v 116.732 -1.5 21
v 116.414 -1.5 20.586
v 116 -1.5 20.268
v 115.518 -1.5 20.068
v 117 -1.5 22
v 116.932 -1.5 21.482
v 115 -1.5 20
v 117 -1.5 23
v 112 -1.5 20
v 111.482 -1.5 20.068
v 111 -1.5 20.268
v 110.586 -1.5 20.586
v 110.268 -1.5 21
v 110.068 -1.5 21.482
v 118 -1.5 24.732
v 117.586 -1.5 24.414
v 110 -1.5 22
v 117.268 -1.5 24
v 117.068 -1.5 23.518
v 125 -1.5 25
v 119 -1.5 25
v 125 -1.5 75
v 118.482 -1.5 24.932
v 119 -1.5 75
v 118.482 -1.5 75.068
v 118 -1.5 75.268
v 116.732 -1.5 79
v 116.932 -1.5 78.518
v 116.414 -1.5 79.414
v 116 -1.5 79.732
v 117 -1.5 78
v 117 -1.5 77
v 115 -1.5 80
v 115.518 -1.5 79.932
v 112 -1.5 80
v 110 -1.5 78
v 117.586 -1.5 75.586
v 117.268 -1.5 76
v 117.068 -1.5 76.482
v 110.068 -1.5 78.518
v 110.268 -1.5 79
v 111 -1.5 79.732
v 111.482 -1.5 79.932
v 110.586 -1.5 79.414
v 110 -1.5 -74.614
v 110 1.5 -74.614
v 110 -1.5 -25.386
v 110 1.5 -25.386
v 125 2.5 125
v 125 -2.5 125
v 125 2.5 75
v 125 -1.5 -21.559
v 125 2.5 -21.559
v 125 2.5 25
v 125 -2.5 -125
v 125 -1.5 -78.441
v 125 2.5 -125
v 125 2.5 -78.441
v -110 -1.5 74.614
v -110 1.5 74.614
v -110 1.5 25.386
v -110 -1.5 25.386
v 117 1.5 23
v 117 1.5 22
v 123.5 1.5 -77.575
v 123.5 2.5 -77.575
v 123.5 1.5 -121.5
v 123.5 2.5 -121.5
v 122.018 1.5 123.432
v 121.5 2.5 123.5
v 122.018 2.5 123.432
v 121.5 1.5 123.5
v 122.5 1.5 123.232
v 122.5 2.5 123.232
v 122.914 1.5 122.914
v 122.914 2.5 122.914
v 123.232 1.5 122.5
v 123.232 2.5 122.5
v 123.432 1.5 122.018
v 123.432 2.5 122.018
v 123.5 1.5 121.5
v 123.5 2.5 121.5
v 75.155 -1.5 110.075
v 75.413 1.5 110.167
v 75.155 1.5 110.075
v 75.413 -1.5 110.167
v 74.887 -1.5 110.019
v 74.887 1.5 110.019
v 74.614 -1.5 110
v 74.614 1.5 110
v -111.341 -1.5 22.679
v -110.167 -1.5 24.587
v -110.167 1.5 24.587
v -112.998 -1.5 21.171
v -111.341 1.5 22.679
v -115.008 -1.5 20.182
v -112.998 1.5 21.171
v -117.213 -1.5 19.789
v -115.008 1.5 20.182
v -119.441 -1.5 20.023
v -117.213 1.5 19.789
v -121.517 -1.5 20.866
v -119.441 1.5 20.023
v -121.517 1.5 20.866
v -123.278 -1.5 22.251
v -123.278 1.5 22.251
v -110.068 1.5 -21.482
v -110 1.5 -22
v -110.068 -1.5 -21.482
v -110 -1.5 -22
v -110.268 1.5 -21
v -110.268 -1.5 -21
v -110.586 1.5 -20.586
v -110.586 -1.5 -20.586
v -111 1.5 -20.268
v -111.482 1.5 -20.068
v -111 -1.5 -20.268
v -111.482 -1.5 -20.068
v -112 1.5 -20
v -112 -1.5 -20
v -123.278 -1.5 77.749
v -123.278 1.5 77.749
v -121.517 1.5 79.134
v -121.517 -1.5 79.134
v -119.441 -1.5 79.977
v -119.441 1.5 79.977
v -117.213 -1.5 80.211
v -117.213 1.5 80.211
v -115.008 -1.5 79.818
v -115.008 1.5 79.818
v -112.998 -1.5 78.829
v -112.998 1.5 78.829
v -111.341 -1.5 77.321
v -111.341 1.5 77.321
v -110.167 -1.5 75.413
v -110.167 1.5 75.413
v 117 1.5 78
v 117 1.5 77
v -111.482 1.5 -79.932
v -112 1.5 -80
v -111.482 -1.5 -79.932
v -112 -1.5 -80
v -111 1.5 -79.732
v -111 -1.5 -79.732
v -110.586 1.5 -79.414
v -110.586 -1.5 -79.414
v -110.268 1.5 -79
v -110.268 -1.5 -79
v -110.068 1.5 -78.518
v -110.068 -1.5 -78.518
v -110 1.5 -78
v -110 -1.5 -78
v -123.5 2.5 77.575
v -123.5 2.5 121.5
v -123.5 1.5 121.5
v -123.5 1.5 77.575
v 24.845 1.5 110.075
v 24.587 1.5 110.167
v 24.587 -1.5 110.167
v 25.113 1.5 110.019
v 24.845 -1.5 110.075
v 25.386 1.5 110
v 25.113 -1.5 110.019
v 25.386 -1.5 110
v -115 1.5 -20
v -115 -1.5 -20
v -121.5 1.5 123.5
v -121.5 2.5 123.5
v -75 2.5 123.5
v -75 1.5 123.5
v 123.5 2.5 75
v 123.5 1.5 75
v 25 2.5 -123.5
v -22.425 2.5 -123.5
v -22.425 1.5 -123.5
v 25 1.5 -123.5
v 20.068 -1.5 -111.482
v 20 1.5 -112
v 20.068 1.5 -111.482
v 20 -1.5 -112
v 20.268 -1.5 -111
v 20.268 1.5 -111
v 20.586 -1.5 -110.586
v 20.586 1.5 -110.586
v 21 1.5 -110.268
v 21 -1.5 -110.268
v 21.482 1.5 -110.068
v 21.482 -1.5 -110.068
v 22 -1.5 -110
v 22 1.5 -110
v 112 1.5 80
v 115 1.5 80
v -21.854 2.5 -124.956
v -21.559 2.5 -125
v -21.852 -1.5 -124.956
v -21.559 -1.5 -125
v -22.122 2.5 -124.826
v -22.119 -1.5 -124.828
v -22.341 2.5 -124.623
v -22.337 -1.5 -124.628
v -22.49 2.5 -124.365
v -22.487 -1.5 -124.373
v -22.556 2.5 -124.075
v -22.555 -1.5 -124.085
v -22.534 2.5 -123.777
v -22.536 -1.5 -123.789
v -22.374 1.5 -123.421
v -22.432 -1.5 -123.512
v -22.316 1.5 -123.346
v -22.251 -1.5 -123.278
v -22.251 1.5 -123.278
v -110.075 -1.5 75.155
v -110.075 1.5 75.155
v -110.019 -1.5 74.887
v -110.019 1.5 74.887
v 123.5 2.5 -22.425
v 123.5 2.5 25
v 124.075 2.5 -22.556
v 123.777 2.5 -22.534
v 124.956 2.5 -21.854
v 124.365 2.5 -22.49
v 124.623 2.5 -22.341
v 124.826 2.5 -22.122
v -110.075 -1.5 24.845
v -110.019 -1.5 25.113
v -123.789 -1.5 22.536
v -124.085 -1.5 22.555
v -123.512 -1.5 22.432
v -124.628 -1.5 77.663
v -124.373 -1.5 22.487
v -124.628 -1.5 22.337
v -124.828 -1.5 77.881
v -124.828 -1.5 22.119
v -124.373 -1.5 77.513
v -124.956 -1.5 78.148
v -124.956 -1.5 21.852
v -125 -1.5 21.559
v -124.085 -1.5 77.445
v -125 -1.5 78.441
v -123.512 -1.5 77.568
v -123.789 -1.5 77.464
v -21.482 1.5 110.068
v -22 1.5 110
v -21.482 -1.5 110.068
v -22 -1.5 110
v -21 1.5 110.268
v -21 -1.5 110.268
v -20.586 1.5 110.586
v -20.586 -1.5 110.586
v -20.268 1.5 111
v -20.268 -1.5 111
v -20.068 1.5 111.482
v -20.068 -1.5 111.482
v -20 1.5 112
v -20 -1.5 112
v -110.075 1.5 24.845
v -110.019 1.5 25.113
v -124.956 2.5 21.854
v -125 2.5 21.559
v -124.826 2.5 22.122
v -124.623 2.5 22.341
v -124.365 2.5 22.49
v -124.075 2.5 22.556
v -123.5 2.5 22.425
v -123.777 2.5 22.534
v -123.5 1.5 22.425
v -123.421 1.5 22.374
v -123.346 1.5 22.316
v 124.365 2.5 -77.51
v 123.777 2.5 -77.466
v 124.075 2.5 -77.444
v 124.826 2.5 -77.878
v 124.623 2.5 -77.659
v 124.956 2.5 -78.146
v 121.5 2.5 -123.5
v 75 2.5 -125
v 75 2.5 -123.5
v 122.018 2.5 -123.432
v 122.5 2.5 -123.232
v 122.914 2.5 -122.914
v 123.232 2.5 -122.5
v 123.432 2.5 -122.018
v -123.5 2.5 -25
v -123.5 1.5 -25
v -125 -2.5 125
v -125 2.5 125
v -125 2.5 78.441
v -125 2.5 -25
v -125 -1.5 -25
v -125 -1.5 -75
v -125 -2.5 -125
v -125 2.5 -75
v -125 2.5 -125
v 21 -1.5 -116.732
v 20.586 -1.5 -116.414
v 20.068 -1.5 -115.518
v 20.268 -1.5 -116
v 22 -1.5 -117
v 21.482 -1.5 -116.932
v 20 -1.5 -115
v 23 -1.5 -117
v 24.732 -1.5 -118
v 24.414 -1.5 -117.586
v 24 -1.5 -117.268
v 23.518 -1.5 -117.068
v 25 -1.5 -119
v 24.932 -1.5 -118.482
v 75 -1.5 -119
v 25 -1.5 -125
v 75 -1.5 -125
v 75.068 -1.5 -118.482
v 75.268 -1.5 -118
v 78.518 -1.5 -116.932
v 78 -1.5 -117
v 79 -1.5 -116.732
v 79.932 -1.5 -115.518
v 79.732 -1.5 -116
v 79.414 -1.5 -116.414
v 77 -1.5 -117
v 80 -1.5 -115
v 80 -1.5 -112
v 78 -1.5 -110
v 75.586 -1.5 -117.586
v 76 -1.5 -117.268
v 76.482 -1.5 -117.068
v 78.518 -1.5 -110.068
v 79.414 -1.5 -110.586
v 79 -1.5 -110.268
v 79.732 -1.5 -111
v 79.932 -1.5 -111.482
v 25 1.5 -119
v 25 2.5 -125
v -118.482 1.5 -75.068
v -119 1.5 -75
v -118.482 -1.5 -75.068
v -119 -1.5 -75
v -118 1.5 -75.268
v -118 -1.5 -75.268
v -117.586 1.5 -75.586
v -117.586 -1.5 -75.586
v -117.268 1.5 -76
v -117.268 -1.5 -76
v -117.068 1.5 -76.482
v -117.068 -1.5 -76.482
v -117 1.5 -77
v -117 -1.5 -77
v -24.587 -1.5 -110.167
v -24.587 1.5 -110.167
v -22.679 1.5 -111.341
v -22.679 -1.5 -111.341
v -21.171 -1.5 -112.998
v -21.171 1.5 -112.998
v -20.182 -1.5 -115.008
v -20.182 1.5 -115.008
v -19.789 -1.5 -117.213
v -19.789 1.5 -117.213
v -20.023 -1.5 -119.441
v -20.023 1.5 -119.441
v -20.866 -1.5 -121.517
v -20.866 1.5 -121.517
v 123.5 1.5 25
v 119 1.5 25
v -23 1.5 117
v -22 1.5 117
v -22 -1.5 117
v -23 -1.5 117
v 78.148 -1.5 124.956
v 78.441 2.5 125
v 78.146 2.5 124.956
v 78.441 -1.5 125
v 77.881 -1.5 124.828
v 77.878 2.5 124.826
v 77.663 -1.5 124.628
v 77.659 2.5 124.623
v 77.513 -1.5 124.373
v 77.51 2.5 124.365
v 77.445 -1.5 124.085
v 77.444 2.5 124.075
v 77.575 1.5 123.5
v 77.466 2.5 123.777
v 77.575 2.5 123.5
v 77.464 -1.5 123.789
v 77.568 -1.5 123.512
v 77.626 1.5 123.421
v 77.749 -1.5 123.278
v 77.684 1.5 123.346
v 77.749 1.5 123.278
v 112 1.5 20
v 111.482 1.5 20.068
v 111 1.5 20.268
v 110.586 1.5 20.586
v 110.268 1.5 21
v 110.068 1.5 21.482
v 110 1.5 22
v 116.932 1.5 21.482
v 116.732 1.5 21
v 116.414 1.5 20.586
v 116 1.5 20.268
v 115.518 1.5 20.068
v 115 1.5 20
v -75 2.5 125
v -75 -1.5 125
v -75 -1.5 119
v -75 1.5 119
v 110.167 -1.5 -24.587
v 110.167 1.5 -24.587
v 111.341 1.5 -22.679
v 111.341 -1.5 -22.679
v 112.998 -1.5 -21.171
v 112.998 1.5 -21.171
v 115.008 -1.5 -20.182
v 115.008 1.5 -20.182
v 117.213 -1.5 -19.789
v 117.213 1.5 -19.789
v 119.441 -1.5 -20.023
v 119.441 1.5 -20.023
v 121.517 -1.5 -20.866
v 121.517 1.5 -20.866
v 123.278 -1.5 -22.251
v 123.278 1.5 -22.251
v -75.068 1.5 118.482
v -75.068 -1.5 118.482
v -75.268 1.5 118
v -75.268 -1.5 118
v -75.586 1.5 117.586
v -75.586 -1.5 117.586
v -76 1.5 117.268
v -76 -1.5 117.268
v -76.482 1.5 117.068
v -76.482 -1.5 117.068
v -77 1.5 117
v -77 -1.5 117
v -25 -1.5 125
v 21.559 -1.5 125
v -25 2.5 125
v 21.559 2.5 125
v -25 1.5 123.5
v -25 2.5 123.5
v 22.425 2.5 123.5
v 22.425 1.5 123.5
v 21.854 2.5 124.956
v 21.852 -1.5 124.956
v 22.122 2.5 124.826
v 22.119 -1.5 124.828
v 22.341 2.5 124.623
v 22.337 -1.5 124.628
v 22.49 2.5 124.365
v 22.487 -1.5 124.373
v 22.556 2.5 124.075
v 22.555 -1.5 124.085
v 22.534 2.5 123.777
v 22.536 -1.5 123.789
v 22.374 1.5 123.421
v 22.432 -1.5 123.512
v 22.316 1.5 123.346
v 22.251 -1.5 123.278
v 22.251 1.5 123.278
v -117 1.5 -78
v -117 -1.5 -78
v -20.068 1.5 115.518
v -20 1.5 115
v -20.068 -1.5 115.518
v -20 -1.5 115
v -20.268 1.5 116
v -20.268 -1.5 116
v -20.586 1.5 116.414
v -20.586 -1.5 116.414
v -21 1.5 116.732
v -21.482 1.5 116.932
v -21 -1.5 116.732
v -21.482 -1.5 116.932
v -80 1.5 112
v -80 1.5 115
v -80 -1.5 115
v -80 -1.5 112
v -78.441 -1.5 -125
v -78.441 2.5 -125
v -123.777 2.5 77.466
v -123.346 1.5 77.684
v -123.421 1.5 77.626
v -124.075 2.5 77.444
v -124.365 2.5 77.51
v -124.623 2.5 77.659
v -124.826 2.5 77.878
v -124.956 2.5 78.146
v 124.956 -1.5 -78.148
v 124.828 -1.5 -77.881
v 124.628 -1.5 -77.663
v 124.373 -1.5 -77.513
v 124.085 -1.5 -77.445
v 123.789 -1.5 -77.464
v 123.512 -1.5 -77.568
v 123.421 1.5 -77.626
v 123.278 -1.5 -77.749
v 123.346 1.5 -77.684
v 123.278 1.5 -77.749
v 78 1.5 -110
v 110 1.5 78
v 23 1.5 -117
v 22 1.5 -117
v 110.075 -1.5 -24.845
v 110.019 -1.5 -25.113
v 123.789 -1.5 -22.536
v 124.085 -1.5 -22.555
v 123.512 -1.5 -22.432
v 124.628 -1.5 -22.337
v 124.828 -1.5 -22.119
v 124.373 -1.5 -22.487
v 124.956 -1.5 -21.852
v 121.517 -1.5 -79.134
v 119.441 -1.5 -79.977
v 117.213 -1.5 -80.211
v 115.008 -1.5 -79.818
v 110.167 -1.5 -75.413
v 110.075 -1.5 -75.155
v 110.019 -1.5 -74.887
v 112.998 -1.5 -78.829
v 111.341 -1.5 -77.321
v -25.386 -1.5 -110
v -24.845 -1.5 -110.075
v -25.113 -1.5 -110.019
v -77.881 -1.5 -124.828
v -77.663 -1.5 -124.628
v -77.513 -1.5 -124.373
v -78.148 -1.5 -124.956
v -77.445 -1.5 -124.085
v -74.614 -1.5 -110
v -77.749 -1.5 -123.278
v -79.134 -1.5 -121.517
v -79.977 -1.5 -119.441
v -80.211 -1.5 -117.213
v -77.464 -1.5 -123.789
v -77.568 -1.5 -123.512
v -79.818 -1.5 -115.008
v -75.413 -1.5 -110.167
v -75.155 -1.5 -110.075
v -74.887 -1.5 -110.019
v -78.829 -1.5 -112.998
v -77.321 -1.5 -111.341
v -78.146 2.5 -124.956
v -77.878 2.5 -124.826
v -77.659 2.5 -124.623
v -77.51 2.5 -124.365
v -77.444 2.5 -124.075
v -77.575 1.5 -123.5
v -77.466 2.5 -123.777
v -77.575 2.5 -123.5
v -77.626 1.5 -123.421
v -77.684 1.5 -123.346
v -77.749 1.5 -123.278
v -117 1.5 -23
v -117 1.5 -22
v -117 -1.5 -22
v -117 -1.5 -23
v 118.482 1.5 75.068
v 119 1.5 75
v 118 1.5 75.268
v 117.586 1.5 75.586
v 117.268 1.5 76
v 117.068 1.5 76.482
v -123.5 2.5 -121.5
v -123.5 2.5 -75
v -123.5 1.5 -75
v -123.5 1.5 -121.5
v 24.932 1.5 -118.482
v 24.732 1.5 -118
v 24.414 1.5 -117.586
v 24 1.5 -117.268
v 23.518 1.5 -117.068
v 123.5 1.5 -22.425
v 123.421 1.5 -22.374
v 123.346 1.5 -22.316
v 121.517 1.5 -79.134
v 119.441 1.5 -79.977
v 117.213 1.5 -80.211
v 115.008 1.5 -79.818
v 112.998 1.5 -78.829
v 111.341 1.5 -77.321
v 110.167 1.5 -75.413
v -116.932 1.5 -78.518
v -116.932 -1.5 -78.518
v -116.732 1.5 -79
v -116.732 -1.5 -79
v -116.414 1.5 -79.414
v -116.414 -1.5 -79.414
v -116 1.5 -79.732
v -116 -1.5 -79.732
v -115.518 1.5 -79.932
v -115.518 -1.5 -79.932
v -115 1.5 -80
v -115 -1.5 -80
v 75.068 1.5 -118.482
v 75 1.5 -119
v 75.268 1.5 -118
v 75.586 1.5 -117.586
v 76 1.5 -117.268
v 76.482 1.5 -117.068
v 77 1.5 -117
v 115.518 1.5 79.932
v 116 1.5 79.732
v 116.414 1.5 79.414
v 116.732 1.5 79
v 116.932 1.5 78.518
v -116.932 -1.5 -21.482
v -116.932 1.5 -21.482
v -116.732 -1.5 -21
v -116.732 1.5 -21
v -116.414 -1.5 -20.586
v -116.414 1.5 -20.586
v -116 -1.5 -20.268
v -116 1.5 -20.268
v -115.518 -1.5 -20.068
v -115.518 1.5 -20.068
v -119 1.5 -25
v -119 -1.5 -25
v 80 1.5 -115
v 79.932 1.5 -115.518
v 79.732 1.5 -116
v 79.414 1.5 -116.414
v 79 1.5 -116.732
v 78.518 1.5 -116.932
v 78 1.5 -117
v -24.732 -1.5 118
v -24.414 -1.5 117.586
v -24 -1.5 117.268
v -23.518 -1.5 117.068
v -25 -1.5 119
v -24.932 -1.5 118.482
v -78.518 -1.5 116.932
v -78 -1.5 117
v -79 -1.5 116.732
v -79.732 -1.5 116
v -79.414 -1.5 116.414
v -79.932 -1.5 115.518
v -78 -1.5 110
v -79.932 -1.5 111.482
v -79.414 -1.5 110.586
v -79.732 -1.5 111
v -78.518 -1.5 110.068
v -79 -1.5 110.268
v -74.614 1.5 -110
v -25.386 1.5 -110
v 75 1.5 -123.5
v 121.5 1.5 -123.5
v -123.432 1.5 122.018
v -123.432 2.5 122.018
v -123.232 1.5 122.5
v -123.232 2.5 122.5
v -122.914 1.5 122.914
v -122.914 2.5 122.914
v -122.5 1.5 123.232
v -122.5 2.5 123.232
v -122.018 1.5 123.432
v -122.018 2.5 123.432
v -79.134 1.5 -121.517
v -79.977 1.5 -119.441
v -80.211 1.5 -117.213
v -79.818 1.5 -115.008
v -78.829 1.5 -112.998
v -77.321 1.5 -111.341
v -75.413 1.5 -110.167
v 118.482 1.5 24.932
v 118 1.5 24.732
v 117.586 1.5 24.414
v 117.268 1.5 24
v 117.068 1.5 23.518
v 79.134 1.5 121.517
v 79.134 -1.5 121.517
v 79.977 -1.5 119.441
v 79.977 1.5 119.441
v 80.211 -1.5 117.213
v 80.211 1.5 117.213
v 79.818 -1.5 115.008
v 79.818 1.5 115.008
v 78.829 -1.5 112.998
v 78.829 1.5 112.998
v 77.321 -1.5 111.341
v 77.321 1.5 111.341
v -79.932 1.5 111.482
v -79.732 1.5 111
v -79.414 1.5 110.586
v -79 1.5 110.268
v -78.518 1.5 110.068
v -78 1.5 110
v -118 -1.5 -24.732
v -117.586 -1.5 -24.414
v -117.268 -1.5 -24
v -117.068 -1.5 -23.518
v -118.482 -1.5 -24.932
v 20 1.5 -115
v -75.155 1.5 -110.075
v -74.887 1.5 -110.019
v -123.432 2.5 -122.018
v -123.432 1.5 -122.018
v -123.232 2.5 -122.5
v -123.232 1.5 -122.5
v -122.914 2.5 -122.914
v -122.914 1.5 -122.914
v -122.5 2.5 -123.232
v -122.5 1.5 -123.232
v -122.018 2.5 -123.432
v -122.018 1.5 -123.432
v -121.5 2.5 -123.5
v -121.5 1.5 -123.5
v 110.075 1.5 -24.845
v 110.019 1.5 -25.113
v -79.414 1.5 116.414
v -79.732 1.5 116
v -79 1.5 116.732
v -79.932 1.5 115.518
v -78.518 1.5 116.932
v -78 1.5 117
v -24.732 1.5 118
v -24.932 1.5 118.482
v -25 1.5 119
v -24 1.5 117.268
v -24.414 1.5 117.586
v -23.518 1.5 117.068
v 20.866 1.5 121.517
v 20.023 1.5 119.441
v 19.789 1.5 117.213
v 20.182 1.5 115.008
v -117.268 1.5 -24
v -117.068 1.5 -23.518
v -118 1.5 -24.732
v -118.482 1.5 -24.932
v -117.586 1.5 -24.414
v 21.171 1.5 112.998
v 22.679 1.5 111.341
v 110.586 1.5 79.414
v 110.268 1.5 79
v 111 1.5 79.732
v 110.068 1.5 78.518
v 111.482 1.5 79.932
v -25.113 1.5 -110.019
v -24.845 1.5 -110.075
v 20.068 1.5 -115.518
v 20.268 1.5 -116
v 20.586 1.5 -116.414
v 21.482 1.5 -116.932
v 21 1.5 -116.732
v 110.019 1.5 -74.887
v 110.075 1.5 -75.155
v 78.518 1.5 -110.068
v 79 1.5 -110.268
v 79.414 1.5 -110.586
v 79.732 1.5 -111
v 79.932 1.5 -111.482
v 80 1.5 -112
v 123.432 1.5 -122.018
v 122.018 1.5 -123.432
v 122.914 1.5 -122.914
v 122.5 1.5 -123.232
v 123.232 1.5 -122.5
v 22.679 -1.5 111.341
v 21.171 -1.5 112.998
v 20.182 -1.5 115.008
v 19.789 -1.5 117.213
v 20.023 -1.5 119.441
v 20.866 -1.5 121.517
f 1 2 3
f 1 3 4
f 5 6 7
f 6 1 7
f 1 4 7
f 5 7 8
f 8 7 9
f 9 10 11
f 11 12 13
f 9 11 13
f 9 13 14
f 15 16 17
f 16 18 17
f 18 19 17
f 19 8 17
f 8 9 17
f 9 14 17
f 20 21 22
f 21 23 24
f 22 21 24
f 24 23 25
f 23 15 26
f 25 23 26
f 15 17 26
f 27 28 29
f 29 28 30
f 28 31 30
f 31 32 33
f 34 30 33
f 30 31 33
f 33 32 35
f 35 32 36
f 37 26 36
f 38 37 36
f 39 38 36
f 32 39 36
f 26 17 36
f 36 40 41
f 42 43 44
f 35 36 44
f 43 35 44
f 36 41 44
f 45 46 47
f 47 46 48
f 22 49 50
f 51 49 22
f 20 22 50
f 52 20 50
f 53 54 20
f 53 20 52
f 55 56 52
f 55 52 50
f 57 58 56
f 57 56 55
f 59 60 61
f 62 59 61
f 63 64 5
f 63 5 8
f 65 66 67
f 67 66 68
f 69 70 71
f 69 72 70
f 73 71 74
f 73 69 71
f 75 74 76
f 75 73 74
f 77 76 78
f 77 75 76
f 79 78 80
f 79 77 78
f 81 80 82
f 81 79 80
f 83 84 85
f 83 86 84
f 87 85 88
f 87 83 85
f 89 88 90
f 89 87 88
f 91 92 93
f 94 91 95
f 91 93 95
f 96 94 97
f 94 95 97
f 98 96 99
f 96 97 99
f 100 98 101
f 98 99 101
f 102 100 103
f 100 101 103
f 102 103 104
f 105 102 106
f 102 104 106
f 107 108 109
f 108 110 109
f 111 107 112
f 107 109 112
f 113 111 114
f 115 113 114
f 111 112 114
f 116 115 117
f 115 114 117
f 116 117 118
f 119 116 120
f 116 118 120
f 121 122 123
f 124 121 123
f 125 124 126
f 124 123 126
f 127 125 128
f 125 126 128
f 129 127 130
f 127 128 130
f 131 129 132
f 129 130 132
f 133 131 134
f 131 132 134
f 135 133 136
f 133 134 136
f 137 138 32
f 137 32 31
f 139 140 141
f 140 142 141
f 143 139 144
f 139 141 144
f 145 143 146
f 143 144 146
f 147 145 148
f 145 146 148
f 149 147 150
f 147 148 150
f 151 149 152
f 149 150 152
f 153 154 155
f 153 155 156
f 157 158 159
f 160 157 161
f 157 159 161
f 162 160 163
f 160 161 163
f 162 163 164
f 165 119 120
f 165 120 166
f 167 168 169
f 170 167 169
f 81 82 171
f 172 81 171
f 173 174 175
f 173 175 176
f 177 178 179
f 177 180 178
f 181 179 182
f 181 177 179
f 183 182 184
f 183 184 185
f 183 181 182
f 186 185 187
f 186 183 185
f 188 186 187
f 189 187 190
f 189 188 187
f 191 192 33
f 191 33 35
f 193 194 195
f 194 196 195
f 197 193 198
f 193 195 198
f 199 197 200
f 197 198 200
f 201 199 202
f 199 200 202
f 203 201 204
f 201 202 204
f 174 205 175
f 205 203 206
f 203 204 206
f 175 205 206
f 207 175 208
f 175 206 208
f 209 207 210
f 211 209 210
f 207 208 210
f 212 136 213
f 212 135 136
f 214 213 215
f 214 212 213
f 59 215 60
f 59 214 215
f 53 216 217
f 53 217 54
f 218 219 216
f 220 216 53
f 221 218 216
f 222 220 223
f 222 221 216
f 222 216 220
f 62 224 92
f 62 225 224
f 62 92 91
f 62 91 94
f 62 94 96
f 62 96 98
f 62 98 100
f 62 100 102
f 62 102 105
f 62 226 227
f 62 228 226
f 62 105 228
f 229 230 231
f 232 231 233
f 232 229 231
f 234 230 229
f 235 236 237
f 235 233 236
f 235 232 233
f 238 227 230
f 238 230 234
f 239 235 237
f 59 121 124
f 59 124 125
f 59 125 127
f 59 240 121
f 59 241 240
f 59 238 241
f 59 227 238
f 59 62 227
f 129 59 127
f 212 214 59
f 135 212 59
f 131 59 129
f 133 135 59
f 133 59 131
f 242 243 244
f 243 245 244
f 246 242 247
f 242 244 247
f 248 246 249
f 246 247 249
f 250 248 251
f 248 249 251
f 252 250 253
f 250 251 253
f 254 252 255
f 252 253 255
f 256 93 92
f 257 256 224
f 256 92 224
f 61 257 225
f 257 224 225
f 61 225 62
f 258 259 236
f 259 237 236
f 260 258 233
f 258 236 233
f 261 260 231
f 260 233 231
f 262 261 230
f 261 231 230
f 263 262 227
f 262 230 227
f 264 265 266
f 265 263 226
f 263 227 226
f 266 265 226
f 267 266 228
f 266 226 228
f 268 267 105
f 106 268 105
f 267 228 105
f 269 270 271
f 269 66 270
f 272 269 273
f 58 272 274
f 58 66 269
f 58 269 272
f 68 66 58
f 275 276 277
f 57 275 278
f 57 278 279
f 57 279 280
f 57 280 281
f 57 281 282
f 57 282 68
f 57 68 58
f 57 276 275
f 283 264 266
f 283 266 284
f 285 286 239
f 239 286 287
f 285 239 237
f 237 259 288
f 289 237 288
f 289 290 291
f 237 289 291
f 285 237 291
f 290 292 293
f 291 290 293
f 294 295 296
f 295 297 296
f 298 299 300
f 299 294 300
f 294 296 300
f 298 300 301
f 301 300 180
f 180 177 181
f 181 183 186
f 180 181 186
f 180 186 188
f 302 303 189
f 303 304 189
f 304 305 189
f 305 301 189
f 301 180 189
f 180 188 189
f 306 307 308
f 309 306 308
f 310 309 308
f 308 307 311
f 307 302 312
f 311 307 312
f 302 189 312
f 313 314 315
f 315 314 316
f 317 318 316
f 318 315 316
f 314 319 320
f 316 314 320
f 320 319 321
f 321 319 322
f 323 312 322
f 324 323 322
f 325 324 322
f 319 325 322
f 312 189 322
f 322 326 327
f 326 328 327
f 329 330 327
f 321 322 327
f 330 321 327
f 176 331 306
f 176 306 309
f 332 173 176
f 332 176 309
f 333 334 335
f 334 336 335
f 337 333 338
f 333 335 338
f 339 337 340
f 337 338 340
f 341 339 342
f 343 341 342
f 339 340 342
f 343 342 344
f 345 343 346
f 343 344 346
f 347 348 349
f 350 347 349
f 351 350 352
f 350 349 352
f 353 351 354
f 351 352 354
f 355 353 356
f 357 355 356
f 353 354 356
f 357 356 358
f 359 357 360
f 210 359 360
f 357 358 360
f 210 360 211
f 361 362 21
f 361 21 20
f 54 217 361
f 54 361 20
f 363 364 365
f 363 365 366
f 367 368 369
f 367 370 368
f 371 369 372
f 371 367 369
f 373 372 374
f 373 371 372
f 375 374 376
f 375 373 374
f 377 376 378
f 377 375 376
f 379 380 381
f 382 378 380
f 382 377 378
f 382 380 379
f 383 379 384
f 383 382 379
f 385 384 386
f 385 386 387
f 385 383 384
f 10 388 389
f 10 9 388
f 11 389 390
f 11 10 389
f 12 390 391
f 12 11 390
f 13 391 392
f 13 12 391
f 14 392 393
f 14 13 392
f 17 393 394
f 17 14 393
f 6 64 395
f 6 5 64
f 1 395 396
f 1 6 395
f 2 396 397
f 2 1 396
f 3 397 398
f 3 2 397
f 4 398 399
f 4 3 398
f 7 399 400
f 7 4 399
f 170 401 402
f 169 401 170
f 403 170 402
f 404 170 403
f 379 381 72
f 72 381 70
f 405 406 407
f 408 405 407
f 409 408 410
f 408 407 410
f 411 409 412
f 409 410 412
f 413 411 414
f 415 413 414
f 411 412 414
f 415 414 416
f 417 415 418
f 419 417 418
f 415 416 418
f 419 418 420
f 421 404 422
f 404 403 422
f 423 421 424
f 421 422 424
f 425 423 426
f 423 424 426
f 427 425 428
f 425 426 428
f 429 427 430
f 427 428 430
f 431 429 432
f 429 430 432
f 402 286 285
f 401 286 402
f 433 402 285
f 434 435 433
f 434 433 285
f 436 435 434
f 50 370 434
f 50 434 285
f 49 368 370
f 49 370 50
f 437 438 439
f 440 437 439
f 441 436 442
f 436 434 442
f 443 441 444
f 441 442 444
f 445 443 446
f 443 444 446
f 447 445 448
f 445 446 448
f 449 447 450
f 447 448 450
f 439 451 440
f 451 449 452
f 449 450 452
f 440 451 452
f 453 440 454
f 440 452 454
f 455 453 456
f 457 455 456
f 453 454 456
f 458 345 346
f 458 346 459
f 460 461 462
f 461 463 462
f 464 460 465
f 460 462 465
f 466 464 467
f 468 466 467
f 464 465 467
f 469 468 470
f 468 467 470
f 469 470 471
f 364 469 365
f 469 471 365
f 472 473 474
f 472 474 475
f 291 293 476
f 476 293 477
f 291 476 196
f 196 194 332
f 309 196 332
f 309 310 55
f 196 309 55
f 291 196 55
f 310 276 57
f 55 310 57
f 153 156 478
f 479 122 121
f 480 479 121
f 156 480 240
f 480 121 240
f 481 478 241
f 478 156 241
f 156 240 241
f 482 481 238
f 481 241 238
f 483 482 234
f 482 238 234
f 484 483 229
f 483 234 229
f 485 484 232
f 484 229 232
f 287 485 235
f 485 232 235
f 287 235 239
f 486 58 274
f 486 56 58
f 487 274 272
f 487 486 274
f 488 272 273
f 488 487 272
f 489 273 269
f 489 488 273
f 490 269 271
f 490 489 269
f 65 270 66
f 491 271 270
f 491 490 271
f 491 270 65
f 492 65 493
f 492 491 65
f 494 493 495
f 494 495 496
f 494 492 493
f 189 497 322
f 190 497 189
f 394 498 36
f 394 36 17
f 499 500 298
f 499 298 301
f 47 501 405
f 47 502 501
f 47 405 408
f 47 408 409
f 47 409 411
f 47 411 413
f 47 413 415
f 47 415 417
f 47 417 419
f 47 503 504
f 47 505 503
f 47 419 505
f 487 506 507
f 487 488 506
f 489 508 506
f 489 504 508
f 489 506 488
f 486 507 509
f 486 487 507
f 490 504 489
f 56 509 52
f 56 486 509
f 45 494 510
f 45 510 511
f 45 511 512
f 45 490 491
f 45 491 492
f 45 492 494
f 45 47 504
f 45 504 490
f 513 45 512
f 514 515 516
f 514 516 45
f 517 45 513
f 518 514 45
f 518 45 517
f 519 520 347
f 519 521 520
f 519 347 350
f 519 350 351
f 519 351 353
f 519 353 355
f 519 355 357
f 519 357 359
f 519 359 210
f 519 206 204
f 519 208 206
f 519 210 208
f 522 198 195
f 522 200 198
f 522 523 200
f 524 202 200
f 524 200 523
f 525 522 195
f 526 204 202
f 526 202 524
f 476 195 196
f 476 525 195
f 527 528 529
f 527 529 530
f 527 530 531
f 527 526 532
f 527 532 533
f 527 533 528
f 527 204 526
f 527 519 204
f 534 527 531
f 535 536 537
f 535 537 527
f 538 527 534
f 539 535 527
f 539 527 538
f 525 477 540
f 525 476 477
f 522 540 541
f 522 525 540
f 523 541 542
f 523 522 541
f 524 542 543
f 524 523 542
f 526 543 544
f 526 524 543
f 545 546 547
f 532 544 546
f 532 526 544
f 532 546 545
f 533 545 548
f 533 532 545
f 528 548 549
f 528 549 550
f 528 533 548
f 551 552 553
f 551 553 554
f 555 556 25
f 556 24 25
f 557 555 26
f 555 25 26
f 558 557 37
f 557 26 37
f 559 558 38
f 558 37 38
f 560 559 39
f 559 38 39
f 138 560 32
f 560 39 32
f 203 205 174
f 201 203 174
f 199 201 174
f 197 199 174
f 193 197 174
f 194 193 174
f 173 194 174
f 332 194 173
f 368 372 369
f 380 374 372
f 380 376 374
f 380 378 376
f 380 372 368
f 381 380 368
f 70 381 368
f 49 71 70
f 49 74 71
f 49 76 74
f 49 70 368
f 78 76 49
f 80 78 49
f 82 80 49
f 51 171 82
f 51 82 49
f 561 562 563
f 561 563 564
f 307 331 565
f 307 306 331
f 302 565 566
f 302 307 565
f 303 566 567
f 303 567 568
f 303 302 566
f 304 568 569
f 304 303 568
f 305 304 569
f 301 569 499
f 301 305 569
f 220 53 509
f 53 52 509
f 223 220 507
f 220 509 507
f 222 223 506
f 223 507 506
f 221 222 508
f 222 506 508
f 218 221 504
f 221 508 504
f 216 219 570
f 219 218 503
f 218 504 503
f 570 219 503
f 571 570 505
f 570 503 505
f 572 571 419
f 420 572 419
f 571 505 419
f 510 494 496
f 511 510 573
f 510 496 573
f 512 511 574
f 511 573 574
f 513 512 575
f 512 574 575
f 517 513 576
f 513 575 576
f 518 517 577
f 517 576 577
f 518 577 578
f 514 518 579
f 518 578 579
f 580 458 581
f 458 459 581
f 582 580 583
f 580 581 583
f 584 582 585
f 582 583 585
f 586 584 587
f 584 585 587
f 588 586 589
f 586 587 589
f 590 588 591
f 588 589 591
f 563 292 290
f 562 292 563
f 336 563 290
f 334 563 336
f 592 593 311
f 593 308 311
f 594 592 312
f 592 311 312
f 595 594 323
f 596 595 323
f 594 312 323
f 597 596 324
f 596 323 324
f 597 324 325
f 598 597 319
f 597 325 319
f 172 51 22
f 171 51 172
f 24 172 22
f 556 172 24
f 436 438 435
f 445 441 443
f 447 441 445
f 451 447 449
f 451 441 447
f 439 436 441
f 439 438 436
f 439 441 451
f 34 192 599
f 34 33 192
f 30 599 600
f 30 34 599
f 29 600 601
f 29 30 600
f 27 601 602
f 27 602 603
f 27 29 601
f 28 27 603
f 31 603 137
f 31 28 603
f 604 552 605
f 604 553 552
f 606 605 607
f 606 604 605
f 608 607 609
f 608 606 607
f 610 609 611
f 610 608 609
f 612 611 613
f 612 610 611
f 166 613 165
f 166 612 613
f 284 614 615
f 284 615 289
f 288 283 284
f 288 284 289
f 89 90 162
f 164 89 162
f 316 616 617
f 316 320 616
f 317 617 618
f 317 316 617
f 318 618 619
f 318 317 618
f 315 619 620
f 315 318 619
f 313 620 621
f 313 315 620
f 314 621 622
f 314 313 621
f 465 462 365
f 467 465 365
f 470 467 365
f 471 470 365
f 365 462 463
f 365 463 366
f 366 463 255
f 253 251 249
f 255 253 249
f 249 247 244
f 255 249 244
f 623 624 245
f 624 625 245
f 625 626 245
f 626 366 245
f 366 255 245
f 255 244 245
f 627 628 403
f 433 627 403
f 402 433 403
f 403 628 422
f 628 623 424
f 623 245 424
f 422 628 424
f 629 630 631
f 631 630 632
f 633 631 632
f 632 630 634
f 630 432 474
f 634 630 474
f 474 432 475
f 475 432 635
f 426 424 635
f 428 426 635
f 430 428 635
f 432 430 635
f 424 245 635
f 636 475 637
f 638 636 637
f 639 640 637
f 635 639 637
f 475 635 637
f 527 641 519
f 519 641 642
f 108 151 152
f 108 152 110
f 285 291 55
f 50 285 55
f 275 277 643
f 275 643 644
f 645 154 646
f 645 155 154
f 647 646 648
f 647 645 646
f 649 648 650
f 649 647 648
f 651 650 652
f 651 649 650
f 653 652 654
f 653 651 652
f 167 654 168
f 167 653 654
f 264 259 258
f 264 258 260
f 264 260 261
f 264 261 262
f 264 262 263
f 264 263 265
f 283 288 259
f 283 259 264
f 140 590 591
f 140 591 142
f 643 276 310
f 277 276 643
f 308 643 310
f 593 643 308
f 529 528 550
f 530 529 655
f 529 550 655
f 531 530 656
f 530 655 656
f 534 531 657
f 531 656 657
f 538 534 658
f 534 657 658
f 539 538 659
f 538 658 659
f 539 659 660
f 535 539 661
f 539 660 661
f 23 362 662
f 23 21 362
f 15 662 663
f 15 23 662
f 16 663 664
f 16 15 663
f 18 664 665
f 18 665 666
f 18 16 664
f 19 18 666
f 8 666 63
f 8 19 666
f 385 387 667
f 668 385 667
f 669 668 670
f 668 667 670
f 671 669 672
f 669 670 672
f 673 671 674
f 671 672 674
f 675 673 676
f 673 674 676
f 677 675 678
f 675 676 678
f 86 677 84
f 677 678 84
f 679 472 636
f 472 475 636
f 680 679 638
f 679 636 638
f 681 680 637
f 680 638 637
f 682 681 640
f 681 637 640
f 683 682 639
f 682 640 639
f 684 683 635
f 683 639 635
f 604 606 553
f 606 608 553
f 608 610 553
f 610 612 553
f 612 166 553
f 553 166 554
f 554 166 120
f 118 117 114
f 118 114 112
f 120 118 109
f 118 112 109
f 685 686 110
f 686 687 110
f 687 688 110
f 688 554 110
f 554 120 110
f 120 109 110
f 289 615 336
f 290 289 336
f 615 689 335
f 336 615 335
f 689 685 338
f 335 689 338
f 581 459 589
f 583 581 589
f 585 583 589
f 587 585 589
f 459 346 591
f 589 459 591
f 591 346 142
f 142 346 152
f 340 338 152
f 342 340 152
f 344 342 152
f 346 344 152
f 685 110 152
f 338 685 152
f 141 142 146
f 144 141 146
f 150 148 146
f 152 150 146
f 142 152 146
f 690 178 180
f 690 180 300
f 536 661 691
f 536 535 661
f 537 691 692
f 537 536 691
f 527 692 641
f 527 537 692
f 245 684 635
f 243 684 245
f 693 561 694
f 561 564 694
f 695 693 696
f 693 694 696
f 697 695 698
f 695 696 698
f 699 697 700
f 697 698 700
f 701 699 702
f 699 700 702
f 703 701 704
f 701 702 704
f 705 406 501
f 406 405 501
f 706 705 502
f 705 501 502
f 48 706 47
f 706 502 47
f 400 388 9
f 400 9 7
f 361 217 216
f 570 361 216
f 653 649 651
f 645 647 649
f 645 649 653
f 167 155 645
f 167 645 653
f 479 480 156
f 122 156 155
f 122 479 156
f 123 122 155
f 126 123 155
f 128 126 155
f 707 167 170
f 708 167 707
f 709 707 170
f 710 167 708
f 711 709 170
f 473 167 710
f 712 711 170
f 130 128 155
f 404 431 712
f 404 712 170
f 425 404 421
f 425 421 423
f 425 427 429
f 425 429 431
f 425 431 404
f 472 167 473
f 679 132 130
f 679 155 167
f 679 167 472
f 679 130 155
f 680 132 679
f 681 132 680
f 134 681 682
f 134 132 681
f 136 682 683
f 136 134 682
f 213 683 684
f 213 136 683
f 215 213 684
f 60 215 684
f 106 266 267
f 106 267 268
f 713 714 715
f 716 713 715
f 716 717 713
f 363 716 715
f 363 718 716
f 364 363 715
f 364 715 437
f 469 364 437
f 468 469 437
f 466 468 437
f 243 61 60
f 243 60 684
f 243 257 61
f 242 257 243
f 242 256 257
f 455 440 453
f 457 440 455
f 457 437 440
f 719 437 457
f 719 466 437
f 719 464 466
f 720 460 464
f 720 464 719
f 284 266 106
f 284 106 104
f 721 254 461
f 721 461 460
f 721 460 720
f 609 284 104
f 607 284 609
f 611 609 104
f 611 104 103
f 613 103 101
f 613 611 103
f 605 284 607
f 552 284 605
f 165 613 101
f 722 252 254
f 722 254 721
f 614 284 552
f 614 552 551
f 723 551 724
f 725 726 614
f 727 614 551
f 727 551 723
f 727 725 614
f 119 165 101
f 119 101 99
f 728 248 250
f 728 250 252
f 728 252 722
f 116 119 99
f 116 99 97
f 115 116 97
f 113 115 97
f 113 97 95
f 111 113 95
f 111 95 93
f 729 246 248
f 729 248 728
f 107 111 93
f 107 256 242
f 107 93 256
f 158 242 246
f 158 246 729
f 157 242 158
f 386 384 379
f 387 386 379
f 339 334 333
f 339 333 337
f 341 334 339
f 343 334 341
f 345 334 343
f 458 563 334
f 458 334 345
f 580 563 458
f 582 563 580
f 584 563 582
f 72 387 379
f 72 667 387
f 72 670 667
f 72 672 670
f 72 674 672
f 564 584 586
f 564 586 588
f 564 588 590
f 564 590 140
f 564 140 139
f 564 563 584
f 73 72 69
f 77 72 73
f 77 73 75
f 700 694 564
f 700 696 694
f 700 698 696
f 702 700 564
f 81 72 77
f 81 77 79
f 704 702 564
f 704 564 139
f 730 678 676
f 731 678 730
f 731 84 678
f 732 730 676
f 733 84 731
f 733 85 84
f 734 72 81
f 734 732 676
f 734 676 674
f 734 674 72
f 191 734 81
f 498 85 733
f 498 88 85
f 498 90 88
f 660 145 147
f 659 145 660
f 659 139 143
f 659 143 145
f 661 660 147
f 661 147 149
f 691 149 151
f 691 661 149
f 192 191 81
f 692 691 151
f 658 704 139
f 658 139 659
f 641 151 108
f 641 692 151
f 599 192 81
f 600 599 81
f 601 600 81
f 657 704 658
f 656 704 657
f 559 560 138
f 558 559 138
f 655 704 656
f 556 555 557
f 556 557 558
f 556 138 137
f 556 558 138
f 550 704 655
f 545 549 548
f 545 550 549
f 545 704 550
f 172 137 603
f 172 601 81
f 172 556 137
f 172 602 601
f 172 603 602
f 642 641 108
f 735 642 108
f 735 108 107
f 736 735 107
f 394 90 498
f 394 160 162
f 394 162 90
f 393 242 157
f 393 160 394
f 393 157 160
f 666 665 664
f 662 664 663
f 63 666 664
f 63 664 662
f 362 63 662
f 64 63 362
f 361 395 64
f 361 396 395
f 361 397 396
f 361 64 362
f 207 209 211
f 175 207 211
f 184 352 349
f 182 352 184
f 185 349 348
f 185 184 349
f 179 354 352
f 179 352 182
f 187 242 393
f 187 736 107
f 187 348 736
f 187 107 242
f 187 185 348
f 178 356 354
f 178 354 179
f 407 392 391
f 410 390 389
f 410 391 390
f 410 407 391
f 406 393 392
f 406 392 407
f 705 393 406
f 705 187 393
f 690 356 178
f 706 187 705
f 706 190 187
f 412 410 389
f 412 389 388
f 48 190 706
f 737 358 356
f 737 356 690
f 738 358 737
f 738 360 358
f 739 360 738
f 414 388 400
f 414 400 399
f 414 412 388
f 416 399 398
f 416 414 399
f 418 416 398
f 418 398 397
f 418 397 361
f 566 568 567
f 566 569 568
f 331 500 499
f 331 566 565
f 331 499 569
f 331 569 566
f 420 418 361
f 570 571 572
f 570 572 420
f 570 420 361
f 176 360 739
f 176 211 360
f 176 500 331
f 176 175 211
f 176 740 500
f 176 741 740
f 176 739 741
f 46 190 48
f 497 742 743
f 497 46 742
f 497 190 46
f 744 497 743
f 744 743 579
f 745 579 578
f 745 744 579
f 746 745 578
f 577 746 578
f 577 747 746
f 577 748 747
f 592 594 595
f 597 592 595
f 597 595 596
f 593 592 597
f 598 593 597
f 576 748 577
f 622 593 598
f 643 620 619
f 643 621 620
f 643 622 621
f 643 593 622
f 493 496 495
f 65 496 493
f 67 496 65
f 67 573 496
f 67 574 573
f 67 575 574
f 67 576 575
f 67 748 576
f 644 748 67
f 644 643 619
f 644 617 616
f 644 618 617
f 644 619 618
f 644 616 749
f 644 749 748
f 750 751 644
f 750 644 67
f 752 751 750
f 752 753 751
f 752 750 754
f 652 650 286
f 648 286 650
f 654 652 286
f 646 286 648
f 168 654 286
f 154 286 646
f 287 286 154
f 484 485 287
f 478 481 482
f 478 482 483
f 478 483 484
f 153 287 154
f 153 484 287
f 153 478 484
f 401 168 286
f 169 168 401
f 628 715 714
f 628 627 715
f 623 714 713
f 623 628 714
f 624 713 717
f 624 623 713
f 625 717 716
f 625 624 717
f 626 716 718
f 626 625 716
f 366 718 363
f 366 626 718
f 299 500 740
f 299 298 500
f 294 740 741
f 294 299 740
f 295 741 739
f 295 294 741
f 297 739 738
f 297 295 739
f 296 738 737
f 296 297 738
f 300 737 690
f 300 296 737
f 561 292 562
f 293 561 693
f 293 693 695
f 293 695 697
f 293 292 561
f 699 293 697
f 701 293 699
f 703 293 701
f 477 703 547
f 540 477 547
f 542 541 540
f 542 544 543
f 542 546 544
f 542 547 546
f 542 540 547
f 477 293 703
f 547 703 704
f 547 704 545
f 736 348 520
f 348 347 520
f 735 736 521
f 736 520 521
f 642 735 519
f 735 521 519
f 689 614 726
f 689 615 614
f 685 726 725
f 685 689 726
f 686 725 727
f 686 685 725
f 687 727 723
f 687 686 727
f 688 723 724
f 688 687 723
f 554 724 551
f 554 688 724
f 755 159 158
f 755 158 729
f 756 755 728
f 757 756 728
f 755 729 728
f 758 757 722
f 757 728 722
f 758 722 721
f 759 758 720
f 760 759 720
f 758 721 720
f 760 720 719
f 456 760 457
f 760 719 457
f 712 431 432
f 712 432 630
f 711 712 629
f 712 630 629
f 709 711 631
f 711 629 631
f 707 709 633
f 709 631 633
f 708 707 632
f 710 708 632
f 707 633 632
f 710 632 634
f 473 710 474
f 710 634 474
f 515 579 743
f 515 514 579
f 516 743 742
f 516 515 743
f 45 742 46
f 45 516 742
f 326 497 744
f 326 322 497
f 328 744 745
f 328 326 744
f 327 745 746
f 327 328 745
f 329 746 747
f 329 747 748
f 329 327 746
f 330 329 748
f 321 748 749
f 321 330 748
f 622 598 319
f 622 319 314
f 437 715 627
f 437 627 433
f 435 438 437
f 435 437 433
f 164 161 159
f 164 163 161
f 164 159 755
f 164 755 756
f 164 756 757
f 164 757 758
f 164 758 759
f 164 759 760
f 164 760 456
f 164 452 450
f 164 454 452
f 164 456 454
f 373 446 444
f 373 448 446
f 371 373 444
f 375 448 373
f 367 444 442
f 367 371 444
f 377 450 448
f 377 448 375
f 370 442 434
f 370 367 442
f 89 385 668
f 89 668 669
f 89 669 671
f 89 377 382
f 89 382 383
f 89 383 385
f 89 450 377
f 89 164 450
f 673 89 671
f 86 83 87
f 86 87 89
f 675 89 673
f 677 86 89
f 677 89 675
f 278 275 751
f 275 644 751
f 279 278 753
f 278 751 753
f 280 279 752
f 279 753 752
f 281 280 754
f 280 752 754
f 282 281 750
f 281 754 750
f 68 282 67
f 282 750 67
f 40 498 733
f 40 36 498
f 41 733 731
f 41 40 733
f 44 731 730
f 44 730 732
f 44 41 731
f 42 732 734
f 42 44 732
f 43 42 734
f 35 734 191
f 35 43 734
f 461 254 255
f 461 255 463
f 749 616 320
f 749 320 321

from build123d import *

# Parameters (mm, degrees)
SKETCH1_W           = 250
SKETCH1_H           = 250
BOSS_EXTRUDE1_DEPTH = 2.5
SKETCH2_W           = 247
SKETCH2_H           = 247
CUT_EXTRUDE1_DEPTH  = 1
CUT_EXTRUDE4_DEPTH  = 4
CIRPATTERN1_COUNT   = 4
FILLET2_R           = 2
FILLET3_R           = 1


with BuildPart() as part:
    # Sketch1 → Boss-Extrude1 (new, symmetric)
    with BuildSketch(Plane(origin=(0, 0, 0), x_dir=(1, 0, 0), z_dir=(0, 1, 0))):
        Rectangle(SKETCH1_W, SKETCH1_H)
    extrude(amount=BOSS_EXTRUDE1_DEPTH, both=True)

    # Sketch2 → Cut-Extrude1 (cut)
    with BuildSketch(Plane(origin=(0, 2.5, 0), x_dir=(1, 0, 0), z_dir=(0, 1, 0))):
        Rectangle(SKETCH2_W, SKETCH2_H)
    extrude(amount=-CUT_EXTRUDE1_DEPTH, mode=Mode.SUBTRACT)

    # Sketch5 → Cut-Extrude4 (cut)
    with BuildSketch(Plane(origin=(0, 2.5, 0), x_dir=(1, 0, 0), z_dir=(0, 1, 0))):
        Polygon((-75, -125), (-75, -117), (-80, -117), (-80, -110), (-20, -110), (-20, -117), (-25, -117), (-25, -125), align=None)
        with BuildLine():
            Line((25, -125), (75, -125))
            ThreePointArc((75, -125), (80.216117819, -117.5), (75, -110))
            Line((75, -110), (25, -110))
            ThreePointArc((25, -110), (19.783882181, -117.5), (25, -125))
        make_face()
    cut_extrude4 = extrude(amount=-CUT_EXTRUDE4_DEPTH, mode=Mode.SUBTRACT)

    # CirPattern1: Cut-Extrude4 ×4 about axis
    cirpattern1_axis = Axis((0, -36.47073331, 0), (0, 1, 0))
    for i in range(1, CIRPATTERN1_COUNT):
        add(cut_extrude4.rotate(cirpattern1_axis, i * 360 / CIRPATTERN1_COUNT), mode=Mode.SUBTRACT)

    # Fillet2
    fillet2_edges = [part.edges().sort_by_distance(p)[0] for p in [
        (-117, 0, -25),
        (-117, 0, -20),
        (-110, 0, -20),
        (-110, 0, -80),
        (-117, 0, -80),
        (-123.5, 2, -123.5),
        (-75, 0, -110),
        (-25, 0, -110),
        (25, 0, -117),
        (20, 0, -117),
        (20, 0, -110),
        (80, 0, -110),
        (80, 0, -117),
        (75, 0, -117),
        (123.5, 2, -123.5),
        (110, 0, -75),
        (110, 0, -25),
        (117, 0, 25),
        (117, 0, 20),
        (110, 0, 20),
        (110, 0, 80),
        (117, 0, 80),
        (117, 0, 75),
        (123.5, 2, 123.5),
        (75, 0, 110),
        (25, 0, 110),
        (-25, 0, 117),
        (-20, 0, 117),
        (-20, 0, 110),
        (-80, 0, 110),
        (-80, 0, 117),
        (-75, 0, 117),
        (-123.5, 2, 123.5),
        (-110, 0, 75),
        (-110, 0, 25),
        (-117, 0, -75),
    ]]
    fillet(fillet2_edges, radius=FILLET2_R)

    # Fillet3
    fillet3_edges = [part.edges().sort_by_distance(p)[0] for p in [
        (-75, 0.5, -125),
        (-25, 0.5, -125),
        (125, 0.5, -25),
        (125, 0.5, -75),
        (25, 0.5, 125),
        (75, 0.5, 125),
        (-125, 0.5, 75),
        (-125, 0.5, 25),
    ]]
    fillet(fillet3_edges, radius=FILLET3_R)


solid = part.part
